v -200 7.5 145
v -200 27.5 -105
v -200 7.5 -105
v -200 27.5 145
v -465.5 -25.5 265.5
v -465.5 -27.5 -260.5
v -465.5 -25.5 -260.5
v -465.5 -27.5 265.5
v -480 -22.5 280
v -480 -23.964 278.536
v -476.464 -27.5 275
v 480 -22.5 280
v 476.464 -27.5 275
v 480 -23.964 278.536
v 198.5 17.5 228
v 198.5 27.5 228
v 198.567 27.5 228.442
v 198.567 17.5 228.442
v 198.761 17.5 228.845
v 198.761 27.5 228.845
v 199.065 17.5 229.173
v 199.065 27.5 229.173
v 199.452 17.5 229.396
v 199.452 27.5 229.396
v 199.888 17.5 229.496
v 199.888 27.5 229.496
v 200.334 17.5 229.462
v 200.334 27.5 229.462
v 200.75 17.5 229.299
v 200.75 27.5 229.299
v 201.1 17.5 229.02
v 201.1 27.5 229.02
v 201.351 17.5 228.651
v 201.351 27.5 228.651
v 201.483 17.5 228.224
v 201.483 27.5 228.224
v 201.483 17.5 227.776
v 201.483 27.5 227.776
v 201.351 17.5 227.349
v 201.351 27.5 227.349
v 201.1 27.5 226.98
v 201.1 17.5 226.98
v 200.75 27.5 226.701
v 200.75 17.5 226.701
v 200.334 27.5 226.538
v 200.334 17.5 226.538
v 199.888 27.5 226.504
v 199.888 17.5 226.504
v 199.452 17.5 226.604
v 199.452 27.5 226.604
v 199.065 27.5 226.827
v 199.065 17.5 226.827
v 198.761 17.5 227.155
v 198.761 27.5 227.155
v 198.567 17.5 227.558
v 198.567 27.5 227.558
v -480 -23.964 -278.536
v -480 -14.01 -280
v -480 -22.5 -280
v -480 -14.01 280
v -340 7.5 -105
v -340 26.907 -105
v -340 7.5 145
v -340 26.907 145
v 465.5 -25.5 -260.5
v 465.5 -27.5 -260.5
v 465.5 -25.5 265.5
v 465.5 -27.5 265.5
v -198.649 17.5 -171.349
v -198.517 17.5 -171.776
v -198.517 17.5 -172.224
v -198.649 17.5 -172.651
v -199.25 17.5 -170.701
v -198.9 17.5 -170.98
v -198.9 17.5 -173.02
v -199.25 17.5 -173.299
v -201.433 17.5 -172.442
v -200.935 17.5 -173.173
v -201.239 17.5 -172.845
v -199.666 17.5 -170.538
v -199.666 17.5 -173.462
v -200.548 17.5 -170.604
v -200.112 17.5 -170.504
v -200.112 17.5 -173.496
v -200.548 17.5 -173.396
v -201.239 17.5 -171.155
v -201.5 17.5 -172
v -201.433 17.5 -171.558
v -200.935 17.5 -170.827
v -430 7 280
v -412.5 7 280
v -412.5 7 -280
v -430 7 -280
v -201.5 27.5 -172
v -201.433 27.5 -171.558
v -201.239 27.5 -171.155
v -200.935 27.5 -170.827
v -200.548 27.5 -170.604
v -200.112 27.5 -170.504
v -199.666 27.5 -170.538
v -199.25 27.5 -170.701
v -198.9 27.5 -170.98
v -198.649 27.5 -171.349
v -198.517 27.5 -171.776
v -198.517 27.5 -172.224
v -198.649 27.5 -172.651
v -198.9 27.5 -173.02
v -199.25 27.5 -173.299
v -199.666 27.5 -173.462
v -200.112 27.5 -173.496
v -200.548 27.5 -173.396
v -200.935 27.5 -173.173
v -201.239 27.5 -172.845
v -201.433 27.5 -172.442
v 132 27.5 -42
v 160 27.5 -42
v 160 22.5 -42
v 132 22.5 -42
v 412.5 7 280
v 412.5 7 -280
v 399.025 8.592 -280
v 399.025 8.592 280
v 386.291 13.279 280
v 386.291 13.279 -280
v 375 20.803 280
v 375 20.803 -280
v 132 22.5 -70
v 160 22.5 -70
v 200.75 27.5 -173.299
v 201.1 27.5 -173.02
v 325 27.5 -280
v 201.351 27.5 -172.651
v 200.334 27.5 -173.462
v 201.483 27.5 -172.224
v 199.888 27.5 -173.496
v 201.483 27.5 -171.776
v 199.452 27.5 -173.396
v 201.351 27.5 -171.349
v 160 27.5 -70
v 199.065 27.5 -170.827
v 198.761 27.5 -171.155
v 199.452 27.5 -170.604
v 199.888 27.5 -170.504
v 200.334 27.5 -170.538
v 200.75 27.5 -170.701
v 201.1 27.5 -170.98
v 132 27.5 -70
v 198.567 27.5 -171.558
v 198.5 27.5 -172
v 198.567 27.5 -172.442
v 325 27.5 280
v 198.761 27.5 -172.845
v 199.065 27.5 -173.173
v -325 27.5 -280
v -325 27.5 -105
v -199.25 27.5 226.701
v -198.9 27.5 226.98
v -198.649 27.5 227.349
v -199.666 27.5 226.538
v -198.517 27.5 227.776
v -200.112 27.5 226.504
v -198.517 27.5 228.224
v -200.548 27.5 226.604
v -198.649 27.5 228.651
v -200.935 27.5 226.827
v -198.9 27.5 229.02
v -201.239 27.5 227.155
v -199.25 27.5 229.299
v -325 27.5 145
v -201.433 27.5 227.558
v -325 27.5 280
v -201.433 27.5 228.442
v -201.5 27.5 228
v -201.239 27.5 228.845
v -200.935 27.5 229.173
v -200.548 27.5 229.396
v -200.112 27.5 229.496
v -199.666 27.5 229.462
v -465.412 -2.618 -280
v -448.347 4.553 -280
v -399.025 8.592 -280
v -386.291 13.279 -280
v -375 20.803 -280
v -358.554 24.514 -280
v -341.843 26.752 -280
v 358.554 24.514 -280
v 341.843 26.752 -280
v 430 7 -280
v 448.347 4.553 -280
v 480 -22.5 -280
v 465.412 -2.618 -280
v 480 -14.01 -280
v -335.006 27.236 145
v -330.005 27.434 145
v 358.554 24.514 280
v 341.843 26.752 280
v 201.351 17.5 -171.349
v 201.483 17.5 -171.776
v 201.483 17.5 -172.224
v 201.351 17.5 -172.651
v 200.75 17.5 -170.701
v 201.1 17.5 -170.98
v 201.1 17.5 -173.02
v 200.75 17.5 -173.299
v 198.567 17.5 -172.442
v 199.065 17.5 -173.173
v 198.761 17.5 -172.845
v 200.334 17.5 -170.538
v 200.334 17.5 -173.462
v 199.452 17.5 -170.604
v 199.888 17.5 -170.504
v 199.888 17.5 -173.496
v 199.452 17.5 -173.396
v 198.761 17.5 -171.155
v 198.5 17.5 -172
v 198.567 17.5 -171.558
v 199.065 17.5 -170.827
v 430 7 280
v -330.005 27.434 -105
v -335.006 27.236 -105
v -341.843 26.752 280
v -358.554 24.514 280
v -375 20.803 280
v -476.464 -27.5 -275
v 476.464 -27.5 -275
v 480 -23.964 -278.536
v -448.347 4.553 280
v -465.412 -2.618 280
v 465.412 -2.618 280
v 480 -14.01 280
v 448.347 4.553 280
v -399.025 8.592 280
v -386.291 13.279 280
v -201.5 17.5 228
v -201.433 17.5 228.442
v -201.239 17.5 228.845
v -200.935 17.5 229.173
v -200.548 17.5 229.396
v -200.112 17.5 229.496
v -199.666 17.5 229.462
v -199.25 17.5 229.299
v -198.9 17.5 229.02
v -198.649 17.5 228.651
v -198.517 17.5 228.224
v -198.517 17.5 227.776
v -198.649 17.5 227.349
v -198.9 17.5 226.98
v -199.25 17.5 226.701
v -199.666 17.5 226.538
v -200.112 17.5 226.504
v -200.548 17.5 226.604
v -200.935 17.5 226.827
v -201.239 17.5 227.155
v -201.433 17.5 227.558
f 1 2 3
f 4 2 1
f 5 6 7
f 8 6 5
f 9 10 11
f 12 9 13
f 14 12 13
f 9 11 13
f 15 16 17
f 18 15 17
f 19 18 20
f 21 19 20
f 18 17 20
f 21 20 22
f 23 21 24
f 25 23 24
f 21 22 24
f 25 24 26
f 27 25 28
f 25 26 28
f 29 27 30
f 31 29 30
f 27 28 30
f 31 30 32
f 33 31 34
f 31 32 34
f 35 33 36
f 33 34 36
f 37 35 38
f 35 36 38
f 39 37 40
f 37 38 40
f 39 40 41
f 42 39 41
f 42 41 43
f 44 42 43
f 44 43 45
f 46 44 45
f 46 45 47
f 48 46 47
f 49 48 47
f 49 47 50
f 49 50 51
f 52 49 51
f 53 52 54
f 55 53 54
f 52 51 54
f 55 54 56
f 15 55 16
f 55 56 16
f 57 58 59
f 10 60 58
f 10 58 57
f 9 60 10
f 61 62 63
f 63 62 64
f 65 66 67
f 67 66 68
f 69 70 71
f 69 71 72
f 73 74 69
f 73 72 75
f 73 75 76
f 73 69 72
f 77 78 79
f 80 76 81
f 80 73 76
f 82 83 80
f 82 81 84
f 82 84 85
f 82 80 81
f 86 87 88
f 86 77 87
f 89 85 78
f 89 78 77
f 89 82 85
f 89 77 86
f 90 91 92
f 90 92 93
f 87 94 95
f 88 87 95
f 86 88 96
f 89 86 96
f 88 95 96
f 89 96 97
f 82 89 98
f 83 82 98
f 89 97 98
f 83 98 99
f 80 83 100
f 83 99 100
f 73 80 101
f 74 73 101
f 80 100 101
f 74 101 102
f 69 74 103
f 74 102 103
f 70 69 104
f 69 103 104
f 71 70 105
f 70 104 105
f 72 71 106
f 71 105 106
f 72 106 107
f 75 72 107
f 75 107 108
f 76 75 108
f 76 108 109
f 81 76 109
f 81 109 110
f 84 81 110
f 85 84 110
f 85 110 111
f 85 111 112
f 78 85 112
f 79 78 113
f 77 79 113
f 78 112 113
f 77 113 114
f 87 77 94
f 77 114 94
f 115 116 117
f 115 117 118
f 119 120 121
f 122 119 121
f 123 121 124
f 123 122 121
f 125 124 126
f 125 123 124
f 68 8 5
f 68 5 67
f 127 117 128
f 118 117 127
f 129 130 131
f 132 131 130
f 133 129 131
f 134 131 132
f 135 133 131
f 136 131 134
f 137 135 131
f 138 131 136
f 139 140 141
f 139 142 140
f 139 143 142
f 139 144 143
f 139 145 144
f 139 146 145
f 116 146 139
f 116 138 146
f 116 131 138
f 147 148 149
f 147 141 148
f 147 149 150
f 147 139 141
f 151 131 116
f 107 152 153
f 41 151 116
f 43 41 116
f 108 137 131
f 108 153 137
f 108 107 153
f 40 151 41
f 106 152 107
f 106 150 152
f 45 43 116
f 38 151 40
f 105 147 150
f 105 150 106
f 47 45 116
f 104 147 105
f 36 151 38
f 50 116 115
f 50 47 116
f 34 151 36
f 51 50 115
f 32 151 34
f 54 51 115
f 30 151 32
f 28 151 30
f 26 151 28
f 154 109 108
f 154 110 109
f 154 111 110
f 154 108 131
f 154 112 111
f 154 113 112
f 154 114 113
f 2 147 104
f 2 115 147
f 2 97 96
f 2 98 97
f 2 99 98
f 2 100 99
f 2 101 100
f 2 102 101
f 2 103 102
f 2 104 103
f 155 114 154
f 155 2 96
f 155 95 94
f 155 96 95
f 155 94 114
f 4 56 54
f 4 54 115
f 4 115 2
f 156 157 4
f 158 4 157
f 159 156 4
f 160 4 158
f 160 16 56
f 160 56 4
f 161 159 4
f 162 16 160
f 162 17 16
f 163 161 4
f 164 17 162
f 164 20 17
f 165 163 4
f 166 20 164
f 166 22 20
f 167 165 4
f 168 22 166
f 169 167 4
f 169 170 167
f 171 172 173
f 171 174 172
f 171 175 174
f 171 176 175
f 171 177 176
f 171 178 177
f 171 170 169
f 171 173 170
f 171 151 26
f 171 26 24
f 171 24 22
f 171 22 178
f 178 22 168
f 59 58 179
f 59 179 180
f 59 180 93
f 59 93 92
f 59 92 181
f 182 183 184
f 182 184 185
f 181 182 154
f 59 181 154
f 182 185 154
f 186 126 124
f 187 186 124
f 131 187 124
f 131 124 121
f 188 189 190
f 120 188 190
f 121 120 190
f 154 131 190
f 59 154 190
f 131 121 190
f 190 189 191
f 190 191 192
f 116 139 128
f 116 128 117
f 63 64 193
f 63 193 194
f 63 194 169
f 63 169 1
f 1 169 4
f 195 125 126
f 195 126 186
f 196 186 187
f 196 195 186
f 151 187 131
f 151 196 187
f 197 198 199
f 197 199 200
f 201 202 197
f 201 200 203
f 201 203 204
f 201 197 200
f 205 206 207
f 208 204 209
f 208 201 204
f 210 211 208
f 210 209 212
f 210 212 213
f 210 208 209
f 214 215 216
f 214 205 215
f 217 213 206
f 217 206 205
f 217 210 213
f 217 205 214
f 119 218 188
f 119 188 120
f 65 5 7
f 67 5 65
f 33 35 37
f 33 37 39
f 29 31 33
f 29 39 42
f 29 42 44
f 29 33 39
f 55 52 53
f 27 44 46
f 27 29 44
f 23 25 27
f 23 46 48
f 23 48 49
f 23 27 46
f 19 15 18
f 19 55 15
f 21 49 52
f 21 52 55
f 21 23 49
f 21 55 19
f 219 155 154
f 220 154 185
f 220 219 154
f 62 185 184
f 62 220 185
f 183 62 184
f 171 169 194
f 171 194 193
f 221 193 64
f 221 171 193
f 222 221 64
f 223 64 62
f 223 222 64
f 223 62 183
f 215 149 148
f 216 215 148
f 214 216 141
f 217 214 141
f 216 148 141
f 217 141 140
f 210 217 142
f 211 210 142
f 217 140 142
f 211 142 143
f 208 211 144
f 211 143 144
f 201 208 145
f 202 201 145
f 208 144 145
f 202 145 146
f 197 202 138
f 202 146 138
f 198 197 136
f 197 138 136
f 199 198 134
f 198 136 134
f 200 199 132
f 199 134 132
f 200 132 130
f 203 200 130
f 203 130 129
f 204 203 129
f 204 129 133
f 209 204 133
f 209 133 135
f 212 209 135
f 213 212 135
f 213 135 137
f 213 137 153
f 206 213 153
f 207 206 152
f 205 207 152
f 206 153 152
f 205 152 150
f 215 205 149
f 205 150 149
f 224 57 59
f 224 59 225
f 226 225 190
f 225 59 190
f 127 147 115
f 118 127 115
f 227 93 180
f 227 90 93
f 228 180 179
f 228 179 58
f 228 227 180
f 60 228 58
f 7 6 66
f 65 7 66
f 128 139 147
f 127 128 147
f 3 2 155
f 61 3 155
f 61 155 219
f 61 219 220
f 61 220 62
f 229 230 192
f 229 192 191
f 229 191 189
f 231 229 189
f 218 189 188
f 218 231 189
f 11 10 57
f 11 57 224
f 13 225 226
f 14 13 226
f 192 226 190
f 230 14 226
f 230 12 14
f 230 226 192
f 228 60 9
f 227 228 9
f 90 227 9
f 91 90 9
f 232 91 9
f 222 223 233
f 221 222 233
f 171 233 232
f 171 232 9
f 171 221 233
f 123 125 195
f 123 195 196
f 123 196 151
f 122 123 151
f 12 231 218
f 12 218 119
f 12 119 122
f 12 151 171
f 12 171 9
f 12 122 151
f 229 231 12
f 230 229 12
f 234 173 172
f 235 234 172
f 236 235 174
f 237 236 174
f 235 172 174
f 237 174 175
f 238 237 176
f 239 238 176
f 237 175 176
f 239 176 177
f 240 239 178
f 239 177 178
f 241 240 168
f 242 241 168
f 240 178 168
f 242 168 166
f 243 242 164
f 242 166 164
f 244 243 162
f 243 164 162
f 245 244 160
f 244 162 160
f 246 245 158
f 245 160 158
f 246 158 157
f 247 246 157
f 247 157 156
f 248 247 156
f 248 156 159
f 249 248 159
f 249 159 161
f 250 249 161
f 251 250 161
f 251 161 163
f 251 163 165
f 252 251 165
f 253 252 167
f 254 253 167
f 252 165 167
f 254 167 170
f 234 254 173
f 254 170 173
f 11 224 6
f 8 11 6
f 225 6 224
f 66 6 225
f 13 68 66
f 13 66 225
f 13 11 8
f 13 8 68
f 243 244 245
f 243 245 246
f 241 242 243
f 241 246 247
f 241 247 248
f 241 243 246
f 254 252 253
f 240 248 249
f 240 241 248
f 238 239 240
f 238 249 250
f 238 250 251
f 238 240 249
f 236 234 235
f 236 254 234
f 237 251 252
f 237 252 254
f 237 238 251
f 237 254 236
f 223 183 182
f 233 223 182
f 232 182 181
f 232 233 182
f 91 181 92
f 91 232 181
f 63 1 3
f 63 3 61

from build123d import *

# Parameters (mm, degrees)
F1_DEPTH  = 280
F2_SIZE   = 5
F3_W      = 931
F3_H      = 526
F4_DEPTH  = 2
F5_R      = 1.5
F6_DEPTH  = 10
F7_W      = 15
F7_H      = 250
F7_W_2    = 125
F8_DEPTH  = 20
F9_W      = 28
F9_H      = 28
F10_DEPTH = 5


with BuildPart() as f1:
    # F0 (on Top) → F1 (new body, symmetric)
    with BuildSketch(Plane.XY):
        with BuildLine():
            Line((-480, -23.964466), (-476.464466, -27.5))
            Line((-476.464466, -27.5), (0, -27.5))
            Line((0, -27.5), (0, 27.5))
            Line((0, 27.5), (-325, 27.5))
            ThreePointArc((-325, 27.5), (-350.22325, 25.818315), (-375, 20.803028))
            ThreePointArc((-375, 20.803028), (-392.520175, 10.560332), (-412.5, 7))
            Line((-412.5, 7), (-430, 7))
            ThreePointArc((-430, 7), (-457.11747, 1.534044), (-480, -14.010205))
            Line((-480, -14.010205), (-480, -23.964466))
        make_face()
        with BuildLine():
            Line((0, 27.5), (0, -27.5))
            Line((0, -27.5), (476.464466, -27.5))
            Line((476.464466, -27.5), (480, -23.964466))
            Line((480, -23.964466), (480, -14.010205))
            ThreePointArc((480, -14.010205), (457.11747, 1.534044), (430, 7))
            Line((430, 7), (412.5, 7))
            ThreePointArc((412.5, 7), (392.520175, 10.560332), (375, 20.803028))
            ThreePointArc((375, 20.803028), (350.22325, 25.818315), (325, 27.5))
            Line((325, 27.5), (0, 27.5))
        make_face()
    extrude(amount=F1_DEPTH, both=True)

    # F2
    f2_edges = [f1.edges().sort_by_distance(p)[0] for p in [
        (0, -27.5, 280),
        (0, -27.5, -280),
    ]]
    chamfer(f2_edges, length=F2_SIZE)

    # F3 (on face) → F4 (cut)
    with BuildSketch(Plane.XZ.offset(27.5)):
        with Locations((0, 2.5)):
            Rectangle(F3_W, F3_H)
    extrude(amount=-F4_DEPTH, mode=Mode.SUBTRACT)

    # F5 (on face) → F6 (cut)
    with BuildSketch(Plane(origin=(0, 27.5, 0), x_dir=(-1, 0, 0), z_dir=(0, 1, 0))):
        with Locations((-200, 228)):
            Circle(F5_R)
        with Locations((200, 228)):
            Circle(F5_R)
        with Locations((200, -172)):
            Circle(F5_R)
        with Locations((-200, -172)):
            Circle(F5_R)
    extrude(amount=-F6_DEPTH, mode=Mode.SUBTRACT)

    # F7 (on face) → F8 (cut)
    with BuildSketch(Plane(origin=(0, 27.5, 0), x_dir=(-1, 0, 0), z_dir=(0, 1, 0))):
        with Locations((332.5, 20)):
            Rectangle(F7_W, F7_H)
        with Locations((262.5, 20)):
            Rectangle(F7_W_2, F7_H)
    extrude(amount=-F8_DEPTH, mode=Mode.SUBTRACT)

    # F9 (on face) → F10 (cut)
    with BuildSketch(Plane(origin=(0, 27.5, 0), x_dir=(-1, 0, 0), z_dir=(0, 1, 0))):
        with Locations((-146, -56)):
            Rectangle(F9_W, F9_H)
    extrude(amount=-F10_DEPTH, mode=Mode.SUBTRACT)


solid = f1.part
